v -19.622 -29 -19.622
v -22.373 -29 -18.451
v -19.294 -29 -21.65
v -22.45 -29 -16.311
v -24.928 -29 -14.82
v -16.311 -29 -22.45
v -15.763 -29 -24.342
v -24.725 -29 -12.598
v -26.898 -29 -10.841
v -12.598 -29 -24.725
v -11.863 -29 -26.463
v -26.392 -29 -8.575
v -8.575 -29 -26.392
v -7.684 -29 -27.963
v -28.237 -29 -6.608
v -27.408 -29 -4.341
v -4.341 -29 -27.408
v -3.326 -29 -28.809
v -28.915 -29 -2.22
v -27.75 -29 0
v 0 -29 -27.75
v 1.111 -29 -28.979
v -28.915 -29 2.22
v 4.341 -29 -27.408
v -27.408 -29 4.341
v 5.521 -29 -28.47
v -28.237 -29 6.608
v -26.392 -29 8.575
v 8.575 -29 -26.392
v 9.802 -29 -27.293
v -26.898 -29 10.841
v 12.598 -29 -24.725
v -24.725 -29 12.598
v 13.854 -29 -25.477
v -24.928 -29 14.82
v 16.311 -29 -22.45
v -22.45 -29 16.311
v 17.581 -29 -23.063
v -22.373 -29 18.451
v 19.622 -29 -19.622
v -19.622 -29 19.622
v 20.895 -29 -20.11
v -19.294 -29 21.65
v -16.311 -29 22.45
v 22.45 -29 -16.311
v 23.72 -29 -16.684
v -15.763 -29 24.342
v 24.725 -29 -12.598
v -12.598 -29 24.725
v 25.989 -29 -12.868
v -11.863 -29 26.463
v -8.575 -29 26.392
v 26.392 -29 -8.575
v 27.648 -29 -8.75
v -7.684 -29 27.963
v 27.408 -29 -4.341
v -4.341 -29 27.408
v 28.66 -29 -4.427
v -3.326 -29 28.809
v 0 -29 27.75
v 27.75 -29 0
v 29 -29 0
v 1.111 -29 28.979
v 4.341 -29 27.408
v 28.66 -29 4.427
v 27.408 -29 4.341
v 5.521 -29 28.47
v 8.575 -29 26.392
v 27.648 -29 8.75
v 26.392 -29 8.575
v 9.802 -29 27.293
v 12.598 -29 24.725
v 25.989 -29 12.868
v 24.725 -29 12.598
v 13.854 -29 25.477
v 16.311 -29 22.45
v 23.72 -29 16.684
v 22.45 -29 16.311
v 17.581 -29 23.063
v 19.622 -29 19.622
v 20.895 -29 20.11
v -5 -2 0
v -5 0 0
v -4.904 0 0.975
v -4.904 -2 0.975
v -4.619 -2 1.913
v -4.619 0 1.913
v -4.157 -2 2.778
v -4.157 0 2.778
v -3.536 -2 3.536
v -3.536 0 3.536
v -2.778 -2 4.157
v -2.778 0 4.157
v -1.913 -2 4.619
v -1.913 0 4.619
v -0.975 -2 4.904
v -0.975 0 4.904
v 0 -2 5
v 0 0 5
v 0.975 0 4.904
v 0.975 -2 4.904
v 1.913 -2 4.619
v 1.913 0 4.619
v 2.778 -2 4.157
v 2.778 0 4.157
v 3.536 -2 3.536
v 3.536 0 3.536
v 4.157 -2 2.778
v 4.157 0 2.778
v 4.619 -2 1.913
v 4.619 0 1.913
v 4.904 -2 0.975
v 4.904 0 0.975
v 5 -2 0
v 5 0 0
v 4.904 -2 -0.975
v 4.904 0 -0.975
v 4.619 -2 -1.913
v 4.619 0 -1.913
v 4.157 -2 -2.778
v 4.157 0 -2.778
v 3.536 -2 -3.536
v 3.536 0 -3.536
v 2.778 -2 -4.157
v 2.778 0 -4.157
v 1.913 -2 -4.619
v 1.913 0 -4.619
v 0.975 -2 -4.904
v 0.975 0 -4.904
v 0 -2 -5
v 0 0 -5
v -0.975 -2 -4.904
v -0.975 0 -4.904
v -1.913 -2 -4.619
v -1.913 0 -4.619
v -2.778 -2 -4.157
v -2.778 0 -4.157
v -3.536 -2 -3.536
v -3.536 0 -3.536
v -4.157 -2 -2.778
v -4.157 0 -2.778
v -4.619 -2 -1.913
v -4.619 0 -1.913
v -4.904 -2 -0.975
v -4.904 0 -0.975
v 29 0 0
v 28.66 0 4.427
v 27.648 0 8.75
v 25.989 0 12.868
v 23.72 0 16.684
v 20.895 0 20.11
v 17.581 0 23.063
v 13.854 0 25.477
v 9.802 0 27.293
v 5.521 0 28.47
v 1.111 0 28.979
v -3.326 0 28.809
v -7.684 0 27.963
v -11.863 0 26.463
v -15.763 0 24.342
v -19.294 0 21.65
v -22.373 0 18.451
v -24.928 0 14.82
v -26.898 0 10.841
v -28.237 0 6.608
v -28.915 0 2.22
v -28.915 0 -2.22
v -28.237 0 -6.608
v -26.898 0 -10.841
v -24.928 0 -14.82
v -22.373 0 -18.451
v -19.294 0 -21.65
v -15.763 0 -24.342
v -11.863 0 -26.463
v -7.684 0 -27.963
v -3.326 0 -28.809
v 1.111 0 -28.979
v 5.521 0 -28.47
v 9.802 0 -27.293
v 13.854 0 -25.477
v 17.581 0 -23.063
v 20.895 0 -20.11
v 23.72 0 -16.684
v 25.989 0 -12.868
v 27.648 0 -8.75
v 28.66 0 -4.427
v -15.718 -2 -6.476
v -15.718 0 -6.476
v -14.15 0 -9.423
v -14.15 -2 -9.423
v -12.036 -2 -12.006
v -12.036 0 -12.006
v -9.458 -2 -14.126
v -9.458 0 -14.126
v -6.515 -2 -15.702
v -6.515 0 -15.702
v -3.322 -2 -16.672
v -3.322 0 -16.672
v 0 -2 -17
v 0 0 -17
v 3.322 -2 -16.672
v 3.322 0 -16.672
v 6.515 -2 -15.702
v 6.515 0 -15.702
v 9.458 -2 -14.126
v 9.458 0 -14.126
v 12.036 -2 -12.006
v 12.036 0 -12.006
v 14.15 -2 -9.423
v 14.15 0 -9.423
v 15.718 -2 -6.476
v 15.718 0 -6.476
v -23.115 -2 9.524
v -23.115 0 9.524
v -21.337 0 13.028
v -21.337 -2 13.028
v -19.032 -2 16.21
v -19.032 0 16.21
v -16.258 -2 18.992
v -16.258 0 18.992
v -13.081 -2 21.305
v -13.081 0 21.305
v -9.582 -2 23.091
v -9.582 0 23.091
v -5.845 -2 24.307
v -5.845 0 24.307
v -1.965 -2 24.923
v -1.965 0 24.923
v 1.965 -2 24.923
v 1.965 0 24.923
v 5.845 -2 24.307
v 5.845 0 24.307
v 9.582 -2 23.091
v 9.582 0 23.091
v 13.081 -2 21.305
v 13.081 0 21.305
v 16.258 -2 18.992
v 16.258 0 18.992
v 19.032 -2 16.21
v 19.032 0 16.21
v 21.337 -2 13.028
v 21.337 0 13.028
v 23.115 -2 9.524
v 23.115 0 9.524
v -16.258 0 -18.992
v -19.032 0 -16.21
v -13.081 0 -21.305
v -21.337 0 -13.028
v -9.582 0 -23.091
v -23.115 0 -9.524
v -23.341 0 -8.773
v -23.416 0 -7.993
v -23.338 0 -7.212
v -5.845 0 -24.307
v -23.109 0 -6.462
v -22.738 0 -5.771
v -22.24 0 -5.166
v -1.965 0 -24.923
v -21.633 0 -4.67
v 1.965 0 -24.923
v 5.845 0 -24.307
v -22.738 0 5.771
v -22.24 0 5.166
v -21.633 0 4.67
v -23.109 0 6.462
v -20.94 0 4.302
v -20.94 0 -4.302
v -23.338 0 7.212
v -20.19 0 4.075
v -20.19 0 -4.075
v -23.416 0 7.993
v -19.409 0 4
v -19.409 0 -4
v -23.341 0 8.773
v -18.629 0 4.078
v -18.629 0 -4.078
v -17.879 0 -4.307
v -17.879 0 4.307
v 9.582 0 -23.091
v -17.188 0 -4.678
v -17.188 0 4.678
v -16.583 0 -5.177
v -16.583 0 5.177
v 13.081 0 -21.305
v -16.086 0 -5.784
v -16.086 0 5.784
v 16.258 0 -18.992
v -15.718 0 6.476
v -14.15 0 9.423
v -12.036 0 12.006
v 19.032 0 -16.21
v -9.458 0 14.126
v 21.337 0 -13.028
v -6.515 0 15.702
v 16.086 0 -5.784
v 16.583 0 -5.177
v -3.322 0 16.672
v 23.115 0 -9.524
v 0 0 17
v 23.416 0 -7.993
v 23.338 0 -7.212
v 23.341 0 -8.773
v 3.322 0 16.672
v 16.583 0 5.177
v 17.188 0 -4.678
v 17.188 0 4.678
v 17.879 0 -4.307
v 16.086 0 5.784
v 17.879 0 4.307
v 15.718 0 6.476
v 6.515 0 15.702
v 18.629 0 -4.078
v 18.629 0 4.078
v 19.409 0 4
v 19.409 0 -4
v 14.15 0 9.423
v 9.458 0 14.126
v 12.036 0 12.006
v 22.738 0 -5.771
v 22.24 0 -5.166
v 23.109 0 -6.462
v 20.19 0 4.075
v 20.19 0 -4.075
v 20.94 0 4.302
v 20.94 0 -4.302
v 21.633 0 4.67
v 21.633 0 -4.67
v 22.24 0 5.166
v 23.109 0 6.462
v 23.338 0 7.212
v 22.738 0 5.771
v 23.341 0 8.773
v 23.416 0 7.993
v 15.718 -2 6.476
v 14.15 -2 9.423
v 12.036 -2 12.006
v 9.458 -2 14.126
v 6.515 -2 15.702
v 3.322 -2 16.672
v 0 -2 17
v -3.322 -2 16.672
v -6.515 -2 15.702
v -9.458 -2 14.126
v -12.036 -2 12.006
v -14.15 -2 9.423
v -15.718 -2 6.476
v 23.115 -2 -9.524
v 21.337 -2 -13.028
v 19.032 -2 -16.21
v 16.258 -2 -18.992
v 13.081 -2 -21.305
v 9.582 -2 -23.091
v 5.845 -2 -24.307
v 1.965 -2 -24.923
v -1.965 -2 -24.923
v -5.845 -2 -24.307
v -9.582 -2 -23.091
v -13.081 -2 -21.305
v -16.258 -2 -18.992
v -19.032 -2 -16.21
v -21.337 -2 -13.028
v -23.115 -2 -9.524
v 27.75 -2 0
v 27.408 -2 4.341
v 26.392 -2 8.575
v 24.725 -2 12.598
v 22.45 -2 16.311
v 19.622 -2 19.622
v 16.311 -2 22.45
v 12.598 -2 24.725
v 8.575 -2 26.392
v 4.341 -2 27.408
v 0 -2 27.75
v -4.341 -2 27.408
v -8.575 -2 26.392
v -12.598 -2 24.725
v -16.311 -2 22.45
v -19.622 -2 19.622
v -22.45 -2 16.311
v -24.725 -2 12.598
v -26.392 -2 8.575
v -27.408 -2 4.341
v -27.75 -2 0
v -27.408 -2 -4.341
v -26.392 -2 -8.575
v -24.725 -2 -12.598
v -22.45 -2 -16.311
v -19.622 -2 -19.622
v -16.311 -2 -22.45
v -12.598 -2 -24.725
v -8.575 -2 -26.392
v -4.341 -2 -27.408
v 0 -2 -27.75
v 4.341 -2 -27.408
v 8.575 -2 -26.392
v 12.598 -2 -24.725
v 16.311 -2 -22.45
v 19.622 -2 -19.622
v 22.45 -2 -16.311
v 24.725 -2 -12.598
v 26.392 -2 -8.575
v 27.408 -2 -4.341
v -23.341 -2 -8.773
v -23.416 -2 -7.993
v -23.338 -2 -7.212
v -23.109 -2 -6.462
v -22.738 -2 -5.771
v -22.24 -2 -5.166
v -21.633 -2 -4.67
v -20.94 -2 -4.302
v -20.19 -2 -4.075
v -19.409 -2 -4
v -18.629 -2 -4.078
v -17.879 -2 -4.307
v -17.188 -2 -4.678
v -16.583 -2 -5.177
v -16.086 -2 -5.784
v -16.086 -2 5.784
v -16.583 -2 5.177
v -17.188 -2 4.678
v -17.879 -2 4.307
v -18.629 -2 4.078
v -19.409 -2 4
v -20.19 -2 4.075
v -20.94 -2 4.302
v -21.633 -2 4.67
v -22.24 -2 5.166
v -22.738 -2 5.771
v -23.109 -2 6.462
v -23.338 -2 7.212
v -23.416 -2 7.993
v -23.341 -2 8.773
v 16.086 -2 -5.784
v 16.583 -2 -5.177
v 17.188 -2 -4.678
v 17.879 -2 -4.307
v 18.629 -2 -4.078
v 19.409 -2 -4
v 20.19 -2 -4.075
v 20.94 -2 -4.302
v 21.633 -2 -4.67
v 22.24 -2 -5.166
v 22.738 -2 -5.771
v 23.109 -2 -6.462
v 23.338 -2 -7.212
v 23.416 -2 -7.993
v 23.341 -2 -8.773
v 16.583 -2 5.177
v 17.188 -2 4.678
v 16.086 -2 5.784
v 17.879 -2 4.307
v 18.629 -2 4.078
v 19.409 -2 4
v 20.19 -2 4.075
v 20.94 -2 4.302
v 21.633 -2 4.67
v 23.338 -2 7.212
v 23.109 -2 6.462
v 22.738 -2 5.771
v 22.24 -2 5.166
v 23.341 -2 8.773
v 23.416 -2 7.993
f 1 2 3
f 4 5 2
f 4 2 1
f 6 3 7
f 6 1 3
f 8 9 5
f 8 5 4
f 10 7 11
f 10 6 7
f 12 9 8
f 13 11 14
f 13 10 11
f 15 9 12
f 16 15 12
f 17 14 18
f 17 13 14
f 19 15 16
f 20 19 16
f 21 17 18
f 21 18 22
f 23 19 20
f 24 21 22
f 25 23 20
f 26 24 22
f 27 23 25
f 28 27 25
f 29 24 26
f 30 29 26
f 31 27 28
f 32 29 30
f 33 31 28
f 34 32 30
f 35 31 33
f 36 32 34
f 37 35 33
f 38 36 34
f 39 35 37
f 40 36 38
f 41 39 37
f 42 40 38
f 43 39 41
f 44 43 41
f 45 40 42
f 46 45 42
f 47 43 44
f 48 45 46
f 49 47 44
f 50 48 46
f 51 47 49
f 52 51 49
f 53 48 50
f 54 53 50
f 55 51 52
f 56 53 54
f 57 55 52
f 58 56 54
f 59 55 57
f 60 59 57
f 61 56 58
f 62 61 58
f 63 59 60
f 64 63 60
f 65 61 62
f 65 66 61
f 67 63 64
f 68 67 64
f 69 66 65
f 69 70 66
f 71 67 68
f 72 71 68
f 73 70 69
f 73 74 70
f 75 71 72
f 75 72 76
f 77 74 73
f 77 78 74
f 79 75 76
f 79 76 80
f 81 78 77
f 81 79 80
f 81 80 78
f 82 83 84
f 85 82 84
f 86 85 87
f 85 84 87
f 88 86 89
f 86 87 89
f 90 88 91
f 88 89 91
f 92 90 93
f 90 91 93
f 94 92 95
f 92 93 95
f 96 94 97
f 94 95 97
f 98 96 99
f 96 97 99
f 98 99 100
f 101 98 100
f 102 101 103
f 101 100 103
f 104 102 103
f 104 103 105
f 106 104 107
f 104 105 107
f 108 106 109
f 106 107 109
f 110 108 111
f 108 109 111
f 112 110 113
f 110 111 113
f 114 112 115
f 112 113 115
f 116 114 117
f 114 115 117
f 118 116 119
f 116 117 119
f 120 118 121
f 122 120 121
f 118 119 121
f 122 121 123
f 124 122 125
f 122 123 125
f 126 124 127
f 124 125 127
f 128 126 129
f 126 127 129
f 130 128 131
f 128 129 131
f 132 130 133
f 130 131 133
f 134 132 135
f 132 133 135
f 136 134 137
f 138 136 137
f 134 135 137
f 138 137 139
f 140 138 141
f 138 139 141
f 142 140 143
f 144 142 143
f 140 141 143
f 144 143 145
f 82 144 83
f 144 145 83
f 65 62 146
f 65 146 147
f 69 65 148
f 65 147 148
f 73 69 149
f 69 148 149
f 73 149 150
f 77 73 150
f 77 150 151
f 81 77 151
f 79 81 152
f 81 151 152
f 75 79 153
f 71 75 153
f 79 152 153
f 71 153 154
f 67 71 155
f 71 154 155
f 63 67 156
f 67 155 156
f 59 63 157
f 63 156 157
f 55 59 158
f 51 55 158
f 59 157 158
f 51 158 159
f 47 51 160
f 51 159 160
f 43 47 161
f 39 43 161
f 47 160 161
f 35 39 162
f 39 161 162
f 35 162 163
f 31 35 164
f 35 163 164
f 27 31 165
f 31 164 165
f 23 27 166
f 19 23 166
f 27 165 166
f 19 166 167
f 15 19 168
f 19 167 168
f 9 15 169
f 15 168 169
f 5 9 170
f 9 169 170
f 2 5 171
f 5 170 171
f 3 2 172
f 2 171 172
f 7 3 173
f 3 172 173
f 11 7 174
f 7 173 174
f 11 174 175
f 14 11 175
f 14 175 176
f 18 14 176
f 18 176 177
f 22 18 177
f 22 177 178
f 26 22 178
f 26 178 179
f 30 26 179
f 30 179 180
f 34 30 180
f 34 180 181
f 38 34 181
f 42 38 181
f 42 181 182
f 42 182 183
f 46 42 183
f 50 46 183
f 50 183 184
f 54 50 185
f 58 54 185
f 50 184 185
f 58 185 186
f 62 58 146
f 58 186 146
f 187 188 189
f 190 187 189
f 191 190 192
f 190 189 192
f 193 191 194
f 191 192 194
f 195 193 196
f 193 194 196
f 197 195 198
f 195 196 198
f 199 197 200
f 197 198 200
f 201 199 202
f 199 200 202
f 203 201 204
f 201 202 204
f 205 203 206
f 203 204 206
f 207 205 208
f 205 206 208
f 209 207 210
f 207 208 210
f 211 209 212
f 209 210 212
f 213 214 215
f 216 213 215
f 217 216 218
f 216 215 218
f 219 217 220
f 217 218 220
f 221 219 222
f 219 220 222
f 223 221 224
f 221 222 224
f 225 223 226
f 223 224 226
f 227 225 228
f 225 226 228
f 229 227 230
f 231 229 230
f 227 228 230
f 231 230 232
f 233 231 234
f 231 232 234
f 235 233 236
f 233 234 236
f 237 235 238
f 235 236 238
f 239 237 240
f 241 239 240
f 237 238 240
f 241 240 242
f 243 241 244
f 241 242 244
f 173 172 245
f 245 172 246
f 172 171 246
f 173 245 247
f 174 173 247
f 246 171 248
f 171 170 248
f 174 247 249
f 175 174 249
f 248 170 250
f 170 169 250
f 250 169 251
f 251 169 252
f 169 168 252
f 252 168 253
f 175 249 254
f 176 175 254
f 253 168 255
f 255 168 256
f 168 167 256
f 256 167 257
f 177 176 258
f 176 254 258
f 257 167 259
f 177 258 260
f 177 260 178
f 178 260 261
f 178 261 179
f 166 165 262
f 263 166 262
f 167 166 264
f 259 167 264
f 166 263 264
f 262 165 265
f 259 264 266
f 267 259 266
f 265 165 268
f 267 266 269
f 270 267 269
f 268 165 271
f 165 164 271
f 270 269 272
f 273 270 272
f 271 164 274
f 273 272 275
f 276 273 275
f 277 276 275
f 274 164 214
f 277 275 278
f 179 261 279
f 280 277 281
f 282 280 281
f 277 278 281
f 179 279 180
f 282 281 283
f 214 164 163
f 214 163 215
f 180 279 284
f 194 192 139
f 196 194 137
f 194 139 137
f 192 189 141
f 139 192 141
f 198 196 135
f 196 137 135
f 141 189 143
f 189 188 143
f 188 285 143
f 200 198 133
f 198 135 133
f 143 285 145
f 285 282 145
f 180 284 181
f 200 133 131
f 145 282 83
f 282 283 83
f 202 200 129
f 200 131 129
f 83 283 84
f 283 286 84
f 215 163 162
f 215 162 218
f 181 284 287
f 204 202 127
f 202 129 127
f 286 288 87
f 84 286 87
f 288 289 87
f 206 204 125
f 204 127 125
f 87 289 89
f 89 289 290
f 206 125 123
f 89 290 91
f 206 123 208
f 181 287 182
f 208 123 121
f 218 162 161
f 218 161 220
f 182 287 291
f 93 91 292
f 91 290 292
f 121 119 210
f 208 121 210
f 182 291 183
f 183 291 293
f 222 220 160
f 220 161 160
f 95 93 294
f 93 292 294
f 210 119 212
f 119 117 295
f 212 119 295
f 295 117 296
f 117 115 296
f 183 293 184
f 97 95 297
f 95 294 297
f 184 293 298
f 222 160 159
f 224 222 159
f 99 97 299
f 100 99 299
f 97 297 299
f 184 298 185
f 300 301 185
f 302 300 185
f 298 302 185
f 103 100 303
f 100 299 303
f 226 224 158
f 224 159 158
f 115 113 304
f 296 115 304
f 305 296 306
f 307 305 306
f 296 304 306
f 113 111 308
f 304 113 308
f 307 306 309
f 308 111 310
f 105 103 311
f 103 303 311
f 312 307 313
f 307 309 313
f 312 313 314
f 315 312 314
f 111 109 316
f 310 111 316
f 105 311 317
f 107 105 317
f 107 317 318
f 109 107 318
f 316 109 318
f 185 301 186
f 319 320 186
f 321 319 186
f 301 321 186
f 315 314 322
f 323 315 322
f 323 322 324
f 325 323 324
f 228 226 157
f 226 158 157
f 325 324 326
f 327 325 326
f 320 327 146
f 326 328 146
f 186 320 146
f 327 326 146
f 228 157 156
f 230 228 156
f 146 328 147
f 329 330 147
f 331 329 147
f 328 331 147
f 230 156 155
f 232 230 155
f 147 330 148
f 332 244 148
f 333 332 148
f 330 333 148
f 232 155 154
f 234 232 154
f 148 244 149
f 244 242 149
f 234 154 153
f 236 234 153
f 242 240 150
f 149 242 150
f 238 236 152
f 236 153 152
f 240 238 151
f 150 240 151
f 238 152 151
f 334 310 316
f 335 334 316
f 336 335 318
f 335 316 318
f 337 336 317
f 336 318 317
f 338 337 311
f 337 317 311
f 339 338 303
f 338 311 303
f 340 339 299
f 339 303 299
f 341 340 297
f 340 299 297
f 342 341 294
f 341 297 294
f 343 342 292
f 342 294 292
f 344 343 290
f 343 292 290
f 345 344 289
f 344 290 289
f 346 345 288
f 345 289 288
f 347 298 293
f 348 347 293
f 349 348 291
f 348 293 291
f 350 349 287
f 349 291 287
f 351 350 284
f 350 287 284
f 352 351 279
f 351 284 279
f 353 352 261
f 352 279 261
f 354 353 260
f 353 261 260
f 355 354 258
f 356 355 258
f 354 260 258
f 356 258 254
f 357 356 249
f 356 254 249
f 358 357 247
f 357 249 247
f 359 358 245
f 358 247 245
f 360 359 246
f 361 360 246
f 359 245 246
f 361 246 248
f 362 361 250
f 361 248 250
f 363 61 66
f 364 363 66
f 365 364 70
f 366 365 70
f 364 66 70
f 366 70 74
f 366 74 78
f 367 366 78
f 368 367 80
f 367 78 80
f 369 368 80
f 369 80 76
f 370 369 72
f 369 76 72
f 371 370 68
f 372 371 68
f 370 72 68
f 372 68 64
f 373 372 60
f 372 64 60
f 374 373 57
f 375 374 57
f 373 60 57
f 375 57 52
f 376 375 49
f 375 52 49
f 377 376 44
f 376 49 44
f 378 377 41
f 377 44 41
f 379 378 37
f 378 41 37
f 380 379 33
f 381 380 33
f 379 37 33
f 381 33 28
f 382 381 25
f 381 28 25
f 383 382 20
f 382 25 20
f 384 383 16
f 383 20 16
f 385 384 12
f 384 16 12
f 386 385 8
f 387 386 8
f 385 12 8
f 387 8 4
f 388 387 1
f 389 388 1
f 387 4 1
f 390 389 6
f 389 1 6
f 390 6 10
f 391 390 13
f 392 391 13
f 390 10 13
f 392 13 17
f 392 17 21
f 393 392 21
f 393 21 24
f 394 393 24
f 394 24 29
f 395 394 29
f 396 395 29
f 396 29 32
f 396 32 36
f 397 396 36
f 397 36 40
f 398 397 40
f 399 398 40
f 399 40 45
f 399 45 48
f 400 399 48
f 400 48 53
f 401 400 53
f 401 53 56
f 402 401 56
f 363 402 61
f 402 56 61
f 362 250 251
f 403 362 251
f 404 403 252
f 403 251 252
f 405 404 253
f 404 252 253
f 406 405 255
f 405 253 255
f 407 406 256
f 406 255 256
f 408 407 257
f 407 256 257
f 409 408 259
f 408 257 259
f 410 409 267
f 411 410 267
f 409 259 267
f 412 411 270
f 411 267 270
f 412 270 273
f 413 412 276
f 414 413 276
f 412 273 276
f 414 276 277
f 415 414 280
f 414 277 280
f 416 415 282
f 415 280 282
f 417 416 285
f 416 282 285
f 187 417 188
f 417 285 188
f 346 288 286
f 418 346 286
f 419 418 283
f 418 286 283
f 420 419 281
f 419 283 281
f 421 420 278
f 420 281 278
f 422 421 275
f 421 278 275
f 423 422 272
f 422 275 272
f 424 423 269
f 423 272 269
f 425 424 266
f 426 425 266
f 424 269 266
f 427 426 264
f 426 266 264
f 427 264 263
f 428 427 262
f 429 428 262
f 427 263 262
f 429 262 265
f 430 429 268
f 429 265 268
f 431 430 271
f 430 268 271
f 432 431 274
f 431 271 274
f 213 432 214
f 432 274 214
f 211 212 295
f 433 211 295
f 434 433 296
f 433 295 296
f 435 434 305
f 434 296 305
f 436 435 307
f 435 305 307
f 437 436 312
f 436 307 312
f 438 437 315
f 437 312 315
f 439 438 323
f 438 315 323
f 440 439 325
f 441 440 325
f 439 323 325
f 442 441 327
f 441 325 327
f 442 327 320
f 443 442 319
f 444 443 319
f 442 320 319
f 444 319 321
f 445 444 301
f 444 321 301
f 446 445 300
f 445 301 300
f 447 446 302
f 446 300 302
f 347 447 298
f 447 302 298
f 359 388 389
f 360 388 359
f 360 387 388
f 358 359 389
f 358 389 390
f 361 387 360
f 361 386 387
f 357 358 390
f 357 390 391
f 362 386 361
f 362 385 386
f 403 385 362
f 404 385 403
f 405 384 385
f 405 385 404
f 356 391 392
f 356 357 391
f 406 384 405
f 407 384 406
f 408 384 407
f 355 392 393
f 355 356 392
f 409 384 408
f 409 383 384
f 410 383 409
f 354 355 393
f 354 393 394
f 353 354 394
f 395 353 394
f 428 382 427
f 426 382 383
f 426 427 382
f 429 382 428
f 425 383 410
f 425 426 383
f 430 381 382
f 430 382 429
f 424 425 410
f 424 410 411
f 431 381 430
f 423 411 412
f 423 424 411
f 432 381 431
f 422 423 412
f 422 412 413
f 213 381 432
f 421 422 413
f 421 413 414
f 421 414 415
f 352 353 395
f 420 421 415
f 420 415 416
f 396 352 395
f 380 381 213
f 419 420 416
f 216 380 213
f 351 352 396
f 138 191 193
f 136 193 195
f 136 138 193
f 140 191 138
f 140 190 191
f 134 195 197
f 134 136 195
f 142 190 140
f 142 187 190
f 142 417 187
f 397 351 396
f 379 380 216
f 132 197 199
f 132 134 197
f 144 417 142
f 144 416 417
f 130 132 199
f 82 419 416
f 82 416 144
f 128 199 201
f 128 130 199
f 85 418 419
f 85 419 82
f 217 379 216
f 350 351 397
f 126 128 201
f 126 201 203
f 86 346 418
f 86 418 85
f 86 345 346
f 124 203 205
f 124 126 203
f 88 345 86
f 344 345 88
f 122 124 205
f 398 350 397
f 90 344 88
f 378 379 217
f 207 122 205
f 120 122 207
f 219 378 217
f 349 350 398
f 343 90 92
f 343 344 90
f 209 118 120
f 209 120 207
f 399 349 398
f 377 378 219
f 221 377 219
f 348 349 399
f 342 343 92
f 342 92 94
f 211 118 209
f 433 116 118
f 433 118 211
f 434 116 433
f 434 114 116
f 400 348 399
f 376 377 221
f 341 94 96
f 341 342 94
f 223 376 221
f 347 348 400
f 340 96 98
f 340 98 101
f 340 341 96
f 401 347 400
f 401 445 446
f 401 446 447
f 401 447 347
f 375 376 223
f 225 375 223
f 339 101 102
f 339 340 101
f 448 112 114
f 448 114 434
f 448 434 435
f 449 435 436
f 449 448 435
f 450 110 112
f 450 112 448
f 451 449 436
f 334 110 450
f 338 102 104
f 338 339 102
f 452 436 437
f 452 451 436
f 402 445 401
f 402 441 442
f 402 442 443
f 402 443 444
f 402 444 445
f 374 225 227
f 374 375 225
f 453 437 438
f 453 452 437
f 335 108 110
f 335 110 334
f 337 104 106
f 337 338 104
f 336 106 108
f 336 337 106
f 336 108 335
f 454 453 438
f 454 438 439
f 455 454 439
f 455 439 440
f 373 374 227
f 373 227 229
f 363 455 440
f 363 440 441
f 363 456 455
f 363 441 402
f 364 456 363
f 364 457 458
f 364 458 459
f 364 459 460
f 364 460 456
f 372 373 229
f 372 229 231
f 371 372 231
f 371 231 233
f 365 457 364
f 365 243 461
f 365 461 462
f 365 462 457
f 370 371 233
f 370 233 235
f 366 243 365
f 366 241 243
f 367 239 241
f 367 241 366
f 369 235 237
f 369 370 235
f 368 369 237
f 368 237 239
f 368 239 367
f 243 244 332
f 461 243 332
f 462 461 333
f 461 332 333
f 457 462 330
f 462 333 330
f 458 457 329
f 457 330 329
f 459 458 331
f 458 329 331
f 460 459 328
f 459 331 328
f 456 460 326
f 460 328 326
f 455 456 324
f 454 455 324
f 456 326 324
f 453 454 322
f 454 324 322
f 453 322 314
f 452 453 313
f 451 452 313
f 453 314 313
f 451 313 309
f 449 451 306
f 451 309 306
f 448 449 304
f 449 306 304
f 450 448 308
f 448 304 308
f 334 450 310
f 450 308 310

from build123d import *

# Parameters (mm, degrees)
F0_R     = 29
F1_DEPTH = 29
F2_R     = 27.75
F3_DEPTH = 27
F5_DEPTH = 2
F6_R     = 5
F7_DEPTH = 2


with BuildPart() as f1:
    # F0 (on Front) → F1 (new body)
    with BuildSketch(Plane.XZ):
        Circle(F0_R)
    extrude(amount=F1_DEPTH)

    # F2 (on face) → F3 (cut)
    with BuildSketch(Plane.XZ.offset(29)):
        Circle(F2_R)
    extrude(amount=-F3_DEPTH, mode=Mode.SUBTRACT)

    # F4 (on face) → F5 (cut)
    with BuildSketch(Plane(origin=(0, 0, 0), x_dir=(-1, 0, 0), z_dir=(0, 1, 0))):
        with BuildLine():
            ThreePointArc((-15.718109, -6.47619), (-20.940297, -4.301621), (-23.114866, -9.52381))
            ThreePointArc((-23.114866, -9.52381), (0, -25), (23.114866, -9.52381))
            ThreePointArc((23.114866, -9.52381), (20.940297, -4.301621), (15.718109, -6.47619))
            ThreePointArc((15.718109, -6.47619), (0, -17), (-15.718109, -6.47619))
        make_face()
        with BuildLine():
            ThreePointArc((23.114866, 9.52381), (0, 25), (-23.114866, 9.52381))
            ThreePointArc((-23.114866, 9.52381), (-20.940297, 4.301621), (-15.718109, 6.47619))
            ThreePointArc((-15.718109, 6.47619), (0, 17), (15.718109, 6.47619))
            ThreePointArc((15.718109, 6.47619), (20.940297, 4.301621), (23.114866, 9.52381))
        make_face()
    extrude(amount=-F5_DEPTH, mode=Mode.SUBTRACT)

    # F6 (on face) → F7 (cut)
    with BuildSketch(Plane(origin=(0, 0, 0), x_dir=(-1, 0, 0), z_dir=(0, 1, 0))):
        Circle(F6_R)
    extrude(amount=-F7_DEPTH, mode=Mode.SUBTRACT)


solid = f1.part
